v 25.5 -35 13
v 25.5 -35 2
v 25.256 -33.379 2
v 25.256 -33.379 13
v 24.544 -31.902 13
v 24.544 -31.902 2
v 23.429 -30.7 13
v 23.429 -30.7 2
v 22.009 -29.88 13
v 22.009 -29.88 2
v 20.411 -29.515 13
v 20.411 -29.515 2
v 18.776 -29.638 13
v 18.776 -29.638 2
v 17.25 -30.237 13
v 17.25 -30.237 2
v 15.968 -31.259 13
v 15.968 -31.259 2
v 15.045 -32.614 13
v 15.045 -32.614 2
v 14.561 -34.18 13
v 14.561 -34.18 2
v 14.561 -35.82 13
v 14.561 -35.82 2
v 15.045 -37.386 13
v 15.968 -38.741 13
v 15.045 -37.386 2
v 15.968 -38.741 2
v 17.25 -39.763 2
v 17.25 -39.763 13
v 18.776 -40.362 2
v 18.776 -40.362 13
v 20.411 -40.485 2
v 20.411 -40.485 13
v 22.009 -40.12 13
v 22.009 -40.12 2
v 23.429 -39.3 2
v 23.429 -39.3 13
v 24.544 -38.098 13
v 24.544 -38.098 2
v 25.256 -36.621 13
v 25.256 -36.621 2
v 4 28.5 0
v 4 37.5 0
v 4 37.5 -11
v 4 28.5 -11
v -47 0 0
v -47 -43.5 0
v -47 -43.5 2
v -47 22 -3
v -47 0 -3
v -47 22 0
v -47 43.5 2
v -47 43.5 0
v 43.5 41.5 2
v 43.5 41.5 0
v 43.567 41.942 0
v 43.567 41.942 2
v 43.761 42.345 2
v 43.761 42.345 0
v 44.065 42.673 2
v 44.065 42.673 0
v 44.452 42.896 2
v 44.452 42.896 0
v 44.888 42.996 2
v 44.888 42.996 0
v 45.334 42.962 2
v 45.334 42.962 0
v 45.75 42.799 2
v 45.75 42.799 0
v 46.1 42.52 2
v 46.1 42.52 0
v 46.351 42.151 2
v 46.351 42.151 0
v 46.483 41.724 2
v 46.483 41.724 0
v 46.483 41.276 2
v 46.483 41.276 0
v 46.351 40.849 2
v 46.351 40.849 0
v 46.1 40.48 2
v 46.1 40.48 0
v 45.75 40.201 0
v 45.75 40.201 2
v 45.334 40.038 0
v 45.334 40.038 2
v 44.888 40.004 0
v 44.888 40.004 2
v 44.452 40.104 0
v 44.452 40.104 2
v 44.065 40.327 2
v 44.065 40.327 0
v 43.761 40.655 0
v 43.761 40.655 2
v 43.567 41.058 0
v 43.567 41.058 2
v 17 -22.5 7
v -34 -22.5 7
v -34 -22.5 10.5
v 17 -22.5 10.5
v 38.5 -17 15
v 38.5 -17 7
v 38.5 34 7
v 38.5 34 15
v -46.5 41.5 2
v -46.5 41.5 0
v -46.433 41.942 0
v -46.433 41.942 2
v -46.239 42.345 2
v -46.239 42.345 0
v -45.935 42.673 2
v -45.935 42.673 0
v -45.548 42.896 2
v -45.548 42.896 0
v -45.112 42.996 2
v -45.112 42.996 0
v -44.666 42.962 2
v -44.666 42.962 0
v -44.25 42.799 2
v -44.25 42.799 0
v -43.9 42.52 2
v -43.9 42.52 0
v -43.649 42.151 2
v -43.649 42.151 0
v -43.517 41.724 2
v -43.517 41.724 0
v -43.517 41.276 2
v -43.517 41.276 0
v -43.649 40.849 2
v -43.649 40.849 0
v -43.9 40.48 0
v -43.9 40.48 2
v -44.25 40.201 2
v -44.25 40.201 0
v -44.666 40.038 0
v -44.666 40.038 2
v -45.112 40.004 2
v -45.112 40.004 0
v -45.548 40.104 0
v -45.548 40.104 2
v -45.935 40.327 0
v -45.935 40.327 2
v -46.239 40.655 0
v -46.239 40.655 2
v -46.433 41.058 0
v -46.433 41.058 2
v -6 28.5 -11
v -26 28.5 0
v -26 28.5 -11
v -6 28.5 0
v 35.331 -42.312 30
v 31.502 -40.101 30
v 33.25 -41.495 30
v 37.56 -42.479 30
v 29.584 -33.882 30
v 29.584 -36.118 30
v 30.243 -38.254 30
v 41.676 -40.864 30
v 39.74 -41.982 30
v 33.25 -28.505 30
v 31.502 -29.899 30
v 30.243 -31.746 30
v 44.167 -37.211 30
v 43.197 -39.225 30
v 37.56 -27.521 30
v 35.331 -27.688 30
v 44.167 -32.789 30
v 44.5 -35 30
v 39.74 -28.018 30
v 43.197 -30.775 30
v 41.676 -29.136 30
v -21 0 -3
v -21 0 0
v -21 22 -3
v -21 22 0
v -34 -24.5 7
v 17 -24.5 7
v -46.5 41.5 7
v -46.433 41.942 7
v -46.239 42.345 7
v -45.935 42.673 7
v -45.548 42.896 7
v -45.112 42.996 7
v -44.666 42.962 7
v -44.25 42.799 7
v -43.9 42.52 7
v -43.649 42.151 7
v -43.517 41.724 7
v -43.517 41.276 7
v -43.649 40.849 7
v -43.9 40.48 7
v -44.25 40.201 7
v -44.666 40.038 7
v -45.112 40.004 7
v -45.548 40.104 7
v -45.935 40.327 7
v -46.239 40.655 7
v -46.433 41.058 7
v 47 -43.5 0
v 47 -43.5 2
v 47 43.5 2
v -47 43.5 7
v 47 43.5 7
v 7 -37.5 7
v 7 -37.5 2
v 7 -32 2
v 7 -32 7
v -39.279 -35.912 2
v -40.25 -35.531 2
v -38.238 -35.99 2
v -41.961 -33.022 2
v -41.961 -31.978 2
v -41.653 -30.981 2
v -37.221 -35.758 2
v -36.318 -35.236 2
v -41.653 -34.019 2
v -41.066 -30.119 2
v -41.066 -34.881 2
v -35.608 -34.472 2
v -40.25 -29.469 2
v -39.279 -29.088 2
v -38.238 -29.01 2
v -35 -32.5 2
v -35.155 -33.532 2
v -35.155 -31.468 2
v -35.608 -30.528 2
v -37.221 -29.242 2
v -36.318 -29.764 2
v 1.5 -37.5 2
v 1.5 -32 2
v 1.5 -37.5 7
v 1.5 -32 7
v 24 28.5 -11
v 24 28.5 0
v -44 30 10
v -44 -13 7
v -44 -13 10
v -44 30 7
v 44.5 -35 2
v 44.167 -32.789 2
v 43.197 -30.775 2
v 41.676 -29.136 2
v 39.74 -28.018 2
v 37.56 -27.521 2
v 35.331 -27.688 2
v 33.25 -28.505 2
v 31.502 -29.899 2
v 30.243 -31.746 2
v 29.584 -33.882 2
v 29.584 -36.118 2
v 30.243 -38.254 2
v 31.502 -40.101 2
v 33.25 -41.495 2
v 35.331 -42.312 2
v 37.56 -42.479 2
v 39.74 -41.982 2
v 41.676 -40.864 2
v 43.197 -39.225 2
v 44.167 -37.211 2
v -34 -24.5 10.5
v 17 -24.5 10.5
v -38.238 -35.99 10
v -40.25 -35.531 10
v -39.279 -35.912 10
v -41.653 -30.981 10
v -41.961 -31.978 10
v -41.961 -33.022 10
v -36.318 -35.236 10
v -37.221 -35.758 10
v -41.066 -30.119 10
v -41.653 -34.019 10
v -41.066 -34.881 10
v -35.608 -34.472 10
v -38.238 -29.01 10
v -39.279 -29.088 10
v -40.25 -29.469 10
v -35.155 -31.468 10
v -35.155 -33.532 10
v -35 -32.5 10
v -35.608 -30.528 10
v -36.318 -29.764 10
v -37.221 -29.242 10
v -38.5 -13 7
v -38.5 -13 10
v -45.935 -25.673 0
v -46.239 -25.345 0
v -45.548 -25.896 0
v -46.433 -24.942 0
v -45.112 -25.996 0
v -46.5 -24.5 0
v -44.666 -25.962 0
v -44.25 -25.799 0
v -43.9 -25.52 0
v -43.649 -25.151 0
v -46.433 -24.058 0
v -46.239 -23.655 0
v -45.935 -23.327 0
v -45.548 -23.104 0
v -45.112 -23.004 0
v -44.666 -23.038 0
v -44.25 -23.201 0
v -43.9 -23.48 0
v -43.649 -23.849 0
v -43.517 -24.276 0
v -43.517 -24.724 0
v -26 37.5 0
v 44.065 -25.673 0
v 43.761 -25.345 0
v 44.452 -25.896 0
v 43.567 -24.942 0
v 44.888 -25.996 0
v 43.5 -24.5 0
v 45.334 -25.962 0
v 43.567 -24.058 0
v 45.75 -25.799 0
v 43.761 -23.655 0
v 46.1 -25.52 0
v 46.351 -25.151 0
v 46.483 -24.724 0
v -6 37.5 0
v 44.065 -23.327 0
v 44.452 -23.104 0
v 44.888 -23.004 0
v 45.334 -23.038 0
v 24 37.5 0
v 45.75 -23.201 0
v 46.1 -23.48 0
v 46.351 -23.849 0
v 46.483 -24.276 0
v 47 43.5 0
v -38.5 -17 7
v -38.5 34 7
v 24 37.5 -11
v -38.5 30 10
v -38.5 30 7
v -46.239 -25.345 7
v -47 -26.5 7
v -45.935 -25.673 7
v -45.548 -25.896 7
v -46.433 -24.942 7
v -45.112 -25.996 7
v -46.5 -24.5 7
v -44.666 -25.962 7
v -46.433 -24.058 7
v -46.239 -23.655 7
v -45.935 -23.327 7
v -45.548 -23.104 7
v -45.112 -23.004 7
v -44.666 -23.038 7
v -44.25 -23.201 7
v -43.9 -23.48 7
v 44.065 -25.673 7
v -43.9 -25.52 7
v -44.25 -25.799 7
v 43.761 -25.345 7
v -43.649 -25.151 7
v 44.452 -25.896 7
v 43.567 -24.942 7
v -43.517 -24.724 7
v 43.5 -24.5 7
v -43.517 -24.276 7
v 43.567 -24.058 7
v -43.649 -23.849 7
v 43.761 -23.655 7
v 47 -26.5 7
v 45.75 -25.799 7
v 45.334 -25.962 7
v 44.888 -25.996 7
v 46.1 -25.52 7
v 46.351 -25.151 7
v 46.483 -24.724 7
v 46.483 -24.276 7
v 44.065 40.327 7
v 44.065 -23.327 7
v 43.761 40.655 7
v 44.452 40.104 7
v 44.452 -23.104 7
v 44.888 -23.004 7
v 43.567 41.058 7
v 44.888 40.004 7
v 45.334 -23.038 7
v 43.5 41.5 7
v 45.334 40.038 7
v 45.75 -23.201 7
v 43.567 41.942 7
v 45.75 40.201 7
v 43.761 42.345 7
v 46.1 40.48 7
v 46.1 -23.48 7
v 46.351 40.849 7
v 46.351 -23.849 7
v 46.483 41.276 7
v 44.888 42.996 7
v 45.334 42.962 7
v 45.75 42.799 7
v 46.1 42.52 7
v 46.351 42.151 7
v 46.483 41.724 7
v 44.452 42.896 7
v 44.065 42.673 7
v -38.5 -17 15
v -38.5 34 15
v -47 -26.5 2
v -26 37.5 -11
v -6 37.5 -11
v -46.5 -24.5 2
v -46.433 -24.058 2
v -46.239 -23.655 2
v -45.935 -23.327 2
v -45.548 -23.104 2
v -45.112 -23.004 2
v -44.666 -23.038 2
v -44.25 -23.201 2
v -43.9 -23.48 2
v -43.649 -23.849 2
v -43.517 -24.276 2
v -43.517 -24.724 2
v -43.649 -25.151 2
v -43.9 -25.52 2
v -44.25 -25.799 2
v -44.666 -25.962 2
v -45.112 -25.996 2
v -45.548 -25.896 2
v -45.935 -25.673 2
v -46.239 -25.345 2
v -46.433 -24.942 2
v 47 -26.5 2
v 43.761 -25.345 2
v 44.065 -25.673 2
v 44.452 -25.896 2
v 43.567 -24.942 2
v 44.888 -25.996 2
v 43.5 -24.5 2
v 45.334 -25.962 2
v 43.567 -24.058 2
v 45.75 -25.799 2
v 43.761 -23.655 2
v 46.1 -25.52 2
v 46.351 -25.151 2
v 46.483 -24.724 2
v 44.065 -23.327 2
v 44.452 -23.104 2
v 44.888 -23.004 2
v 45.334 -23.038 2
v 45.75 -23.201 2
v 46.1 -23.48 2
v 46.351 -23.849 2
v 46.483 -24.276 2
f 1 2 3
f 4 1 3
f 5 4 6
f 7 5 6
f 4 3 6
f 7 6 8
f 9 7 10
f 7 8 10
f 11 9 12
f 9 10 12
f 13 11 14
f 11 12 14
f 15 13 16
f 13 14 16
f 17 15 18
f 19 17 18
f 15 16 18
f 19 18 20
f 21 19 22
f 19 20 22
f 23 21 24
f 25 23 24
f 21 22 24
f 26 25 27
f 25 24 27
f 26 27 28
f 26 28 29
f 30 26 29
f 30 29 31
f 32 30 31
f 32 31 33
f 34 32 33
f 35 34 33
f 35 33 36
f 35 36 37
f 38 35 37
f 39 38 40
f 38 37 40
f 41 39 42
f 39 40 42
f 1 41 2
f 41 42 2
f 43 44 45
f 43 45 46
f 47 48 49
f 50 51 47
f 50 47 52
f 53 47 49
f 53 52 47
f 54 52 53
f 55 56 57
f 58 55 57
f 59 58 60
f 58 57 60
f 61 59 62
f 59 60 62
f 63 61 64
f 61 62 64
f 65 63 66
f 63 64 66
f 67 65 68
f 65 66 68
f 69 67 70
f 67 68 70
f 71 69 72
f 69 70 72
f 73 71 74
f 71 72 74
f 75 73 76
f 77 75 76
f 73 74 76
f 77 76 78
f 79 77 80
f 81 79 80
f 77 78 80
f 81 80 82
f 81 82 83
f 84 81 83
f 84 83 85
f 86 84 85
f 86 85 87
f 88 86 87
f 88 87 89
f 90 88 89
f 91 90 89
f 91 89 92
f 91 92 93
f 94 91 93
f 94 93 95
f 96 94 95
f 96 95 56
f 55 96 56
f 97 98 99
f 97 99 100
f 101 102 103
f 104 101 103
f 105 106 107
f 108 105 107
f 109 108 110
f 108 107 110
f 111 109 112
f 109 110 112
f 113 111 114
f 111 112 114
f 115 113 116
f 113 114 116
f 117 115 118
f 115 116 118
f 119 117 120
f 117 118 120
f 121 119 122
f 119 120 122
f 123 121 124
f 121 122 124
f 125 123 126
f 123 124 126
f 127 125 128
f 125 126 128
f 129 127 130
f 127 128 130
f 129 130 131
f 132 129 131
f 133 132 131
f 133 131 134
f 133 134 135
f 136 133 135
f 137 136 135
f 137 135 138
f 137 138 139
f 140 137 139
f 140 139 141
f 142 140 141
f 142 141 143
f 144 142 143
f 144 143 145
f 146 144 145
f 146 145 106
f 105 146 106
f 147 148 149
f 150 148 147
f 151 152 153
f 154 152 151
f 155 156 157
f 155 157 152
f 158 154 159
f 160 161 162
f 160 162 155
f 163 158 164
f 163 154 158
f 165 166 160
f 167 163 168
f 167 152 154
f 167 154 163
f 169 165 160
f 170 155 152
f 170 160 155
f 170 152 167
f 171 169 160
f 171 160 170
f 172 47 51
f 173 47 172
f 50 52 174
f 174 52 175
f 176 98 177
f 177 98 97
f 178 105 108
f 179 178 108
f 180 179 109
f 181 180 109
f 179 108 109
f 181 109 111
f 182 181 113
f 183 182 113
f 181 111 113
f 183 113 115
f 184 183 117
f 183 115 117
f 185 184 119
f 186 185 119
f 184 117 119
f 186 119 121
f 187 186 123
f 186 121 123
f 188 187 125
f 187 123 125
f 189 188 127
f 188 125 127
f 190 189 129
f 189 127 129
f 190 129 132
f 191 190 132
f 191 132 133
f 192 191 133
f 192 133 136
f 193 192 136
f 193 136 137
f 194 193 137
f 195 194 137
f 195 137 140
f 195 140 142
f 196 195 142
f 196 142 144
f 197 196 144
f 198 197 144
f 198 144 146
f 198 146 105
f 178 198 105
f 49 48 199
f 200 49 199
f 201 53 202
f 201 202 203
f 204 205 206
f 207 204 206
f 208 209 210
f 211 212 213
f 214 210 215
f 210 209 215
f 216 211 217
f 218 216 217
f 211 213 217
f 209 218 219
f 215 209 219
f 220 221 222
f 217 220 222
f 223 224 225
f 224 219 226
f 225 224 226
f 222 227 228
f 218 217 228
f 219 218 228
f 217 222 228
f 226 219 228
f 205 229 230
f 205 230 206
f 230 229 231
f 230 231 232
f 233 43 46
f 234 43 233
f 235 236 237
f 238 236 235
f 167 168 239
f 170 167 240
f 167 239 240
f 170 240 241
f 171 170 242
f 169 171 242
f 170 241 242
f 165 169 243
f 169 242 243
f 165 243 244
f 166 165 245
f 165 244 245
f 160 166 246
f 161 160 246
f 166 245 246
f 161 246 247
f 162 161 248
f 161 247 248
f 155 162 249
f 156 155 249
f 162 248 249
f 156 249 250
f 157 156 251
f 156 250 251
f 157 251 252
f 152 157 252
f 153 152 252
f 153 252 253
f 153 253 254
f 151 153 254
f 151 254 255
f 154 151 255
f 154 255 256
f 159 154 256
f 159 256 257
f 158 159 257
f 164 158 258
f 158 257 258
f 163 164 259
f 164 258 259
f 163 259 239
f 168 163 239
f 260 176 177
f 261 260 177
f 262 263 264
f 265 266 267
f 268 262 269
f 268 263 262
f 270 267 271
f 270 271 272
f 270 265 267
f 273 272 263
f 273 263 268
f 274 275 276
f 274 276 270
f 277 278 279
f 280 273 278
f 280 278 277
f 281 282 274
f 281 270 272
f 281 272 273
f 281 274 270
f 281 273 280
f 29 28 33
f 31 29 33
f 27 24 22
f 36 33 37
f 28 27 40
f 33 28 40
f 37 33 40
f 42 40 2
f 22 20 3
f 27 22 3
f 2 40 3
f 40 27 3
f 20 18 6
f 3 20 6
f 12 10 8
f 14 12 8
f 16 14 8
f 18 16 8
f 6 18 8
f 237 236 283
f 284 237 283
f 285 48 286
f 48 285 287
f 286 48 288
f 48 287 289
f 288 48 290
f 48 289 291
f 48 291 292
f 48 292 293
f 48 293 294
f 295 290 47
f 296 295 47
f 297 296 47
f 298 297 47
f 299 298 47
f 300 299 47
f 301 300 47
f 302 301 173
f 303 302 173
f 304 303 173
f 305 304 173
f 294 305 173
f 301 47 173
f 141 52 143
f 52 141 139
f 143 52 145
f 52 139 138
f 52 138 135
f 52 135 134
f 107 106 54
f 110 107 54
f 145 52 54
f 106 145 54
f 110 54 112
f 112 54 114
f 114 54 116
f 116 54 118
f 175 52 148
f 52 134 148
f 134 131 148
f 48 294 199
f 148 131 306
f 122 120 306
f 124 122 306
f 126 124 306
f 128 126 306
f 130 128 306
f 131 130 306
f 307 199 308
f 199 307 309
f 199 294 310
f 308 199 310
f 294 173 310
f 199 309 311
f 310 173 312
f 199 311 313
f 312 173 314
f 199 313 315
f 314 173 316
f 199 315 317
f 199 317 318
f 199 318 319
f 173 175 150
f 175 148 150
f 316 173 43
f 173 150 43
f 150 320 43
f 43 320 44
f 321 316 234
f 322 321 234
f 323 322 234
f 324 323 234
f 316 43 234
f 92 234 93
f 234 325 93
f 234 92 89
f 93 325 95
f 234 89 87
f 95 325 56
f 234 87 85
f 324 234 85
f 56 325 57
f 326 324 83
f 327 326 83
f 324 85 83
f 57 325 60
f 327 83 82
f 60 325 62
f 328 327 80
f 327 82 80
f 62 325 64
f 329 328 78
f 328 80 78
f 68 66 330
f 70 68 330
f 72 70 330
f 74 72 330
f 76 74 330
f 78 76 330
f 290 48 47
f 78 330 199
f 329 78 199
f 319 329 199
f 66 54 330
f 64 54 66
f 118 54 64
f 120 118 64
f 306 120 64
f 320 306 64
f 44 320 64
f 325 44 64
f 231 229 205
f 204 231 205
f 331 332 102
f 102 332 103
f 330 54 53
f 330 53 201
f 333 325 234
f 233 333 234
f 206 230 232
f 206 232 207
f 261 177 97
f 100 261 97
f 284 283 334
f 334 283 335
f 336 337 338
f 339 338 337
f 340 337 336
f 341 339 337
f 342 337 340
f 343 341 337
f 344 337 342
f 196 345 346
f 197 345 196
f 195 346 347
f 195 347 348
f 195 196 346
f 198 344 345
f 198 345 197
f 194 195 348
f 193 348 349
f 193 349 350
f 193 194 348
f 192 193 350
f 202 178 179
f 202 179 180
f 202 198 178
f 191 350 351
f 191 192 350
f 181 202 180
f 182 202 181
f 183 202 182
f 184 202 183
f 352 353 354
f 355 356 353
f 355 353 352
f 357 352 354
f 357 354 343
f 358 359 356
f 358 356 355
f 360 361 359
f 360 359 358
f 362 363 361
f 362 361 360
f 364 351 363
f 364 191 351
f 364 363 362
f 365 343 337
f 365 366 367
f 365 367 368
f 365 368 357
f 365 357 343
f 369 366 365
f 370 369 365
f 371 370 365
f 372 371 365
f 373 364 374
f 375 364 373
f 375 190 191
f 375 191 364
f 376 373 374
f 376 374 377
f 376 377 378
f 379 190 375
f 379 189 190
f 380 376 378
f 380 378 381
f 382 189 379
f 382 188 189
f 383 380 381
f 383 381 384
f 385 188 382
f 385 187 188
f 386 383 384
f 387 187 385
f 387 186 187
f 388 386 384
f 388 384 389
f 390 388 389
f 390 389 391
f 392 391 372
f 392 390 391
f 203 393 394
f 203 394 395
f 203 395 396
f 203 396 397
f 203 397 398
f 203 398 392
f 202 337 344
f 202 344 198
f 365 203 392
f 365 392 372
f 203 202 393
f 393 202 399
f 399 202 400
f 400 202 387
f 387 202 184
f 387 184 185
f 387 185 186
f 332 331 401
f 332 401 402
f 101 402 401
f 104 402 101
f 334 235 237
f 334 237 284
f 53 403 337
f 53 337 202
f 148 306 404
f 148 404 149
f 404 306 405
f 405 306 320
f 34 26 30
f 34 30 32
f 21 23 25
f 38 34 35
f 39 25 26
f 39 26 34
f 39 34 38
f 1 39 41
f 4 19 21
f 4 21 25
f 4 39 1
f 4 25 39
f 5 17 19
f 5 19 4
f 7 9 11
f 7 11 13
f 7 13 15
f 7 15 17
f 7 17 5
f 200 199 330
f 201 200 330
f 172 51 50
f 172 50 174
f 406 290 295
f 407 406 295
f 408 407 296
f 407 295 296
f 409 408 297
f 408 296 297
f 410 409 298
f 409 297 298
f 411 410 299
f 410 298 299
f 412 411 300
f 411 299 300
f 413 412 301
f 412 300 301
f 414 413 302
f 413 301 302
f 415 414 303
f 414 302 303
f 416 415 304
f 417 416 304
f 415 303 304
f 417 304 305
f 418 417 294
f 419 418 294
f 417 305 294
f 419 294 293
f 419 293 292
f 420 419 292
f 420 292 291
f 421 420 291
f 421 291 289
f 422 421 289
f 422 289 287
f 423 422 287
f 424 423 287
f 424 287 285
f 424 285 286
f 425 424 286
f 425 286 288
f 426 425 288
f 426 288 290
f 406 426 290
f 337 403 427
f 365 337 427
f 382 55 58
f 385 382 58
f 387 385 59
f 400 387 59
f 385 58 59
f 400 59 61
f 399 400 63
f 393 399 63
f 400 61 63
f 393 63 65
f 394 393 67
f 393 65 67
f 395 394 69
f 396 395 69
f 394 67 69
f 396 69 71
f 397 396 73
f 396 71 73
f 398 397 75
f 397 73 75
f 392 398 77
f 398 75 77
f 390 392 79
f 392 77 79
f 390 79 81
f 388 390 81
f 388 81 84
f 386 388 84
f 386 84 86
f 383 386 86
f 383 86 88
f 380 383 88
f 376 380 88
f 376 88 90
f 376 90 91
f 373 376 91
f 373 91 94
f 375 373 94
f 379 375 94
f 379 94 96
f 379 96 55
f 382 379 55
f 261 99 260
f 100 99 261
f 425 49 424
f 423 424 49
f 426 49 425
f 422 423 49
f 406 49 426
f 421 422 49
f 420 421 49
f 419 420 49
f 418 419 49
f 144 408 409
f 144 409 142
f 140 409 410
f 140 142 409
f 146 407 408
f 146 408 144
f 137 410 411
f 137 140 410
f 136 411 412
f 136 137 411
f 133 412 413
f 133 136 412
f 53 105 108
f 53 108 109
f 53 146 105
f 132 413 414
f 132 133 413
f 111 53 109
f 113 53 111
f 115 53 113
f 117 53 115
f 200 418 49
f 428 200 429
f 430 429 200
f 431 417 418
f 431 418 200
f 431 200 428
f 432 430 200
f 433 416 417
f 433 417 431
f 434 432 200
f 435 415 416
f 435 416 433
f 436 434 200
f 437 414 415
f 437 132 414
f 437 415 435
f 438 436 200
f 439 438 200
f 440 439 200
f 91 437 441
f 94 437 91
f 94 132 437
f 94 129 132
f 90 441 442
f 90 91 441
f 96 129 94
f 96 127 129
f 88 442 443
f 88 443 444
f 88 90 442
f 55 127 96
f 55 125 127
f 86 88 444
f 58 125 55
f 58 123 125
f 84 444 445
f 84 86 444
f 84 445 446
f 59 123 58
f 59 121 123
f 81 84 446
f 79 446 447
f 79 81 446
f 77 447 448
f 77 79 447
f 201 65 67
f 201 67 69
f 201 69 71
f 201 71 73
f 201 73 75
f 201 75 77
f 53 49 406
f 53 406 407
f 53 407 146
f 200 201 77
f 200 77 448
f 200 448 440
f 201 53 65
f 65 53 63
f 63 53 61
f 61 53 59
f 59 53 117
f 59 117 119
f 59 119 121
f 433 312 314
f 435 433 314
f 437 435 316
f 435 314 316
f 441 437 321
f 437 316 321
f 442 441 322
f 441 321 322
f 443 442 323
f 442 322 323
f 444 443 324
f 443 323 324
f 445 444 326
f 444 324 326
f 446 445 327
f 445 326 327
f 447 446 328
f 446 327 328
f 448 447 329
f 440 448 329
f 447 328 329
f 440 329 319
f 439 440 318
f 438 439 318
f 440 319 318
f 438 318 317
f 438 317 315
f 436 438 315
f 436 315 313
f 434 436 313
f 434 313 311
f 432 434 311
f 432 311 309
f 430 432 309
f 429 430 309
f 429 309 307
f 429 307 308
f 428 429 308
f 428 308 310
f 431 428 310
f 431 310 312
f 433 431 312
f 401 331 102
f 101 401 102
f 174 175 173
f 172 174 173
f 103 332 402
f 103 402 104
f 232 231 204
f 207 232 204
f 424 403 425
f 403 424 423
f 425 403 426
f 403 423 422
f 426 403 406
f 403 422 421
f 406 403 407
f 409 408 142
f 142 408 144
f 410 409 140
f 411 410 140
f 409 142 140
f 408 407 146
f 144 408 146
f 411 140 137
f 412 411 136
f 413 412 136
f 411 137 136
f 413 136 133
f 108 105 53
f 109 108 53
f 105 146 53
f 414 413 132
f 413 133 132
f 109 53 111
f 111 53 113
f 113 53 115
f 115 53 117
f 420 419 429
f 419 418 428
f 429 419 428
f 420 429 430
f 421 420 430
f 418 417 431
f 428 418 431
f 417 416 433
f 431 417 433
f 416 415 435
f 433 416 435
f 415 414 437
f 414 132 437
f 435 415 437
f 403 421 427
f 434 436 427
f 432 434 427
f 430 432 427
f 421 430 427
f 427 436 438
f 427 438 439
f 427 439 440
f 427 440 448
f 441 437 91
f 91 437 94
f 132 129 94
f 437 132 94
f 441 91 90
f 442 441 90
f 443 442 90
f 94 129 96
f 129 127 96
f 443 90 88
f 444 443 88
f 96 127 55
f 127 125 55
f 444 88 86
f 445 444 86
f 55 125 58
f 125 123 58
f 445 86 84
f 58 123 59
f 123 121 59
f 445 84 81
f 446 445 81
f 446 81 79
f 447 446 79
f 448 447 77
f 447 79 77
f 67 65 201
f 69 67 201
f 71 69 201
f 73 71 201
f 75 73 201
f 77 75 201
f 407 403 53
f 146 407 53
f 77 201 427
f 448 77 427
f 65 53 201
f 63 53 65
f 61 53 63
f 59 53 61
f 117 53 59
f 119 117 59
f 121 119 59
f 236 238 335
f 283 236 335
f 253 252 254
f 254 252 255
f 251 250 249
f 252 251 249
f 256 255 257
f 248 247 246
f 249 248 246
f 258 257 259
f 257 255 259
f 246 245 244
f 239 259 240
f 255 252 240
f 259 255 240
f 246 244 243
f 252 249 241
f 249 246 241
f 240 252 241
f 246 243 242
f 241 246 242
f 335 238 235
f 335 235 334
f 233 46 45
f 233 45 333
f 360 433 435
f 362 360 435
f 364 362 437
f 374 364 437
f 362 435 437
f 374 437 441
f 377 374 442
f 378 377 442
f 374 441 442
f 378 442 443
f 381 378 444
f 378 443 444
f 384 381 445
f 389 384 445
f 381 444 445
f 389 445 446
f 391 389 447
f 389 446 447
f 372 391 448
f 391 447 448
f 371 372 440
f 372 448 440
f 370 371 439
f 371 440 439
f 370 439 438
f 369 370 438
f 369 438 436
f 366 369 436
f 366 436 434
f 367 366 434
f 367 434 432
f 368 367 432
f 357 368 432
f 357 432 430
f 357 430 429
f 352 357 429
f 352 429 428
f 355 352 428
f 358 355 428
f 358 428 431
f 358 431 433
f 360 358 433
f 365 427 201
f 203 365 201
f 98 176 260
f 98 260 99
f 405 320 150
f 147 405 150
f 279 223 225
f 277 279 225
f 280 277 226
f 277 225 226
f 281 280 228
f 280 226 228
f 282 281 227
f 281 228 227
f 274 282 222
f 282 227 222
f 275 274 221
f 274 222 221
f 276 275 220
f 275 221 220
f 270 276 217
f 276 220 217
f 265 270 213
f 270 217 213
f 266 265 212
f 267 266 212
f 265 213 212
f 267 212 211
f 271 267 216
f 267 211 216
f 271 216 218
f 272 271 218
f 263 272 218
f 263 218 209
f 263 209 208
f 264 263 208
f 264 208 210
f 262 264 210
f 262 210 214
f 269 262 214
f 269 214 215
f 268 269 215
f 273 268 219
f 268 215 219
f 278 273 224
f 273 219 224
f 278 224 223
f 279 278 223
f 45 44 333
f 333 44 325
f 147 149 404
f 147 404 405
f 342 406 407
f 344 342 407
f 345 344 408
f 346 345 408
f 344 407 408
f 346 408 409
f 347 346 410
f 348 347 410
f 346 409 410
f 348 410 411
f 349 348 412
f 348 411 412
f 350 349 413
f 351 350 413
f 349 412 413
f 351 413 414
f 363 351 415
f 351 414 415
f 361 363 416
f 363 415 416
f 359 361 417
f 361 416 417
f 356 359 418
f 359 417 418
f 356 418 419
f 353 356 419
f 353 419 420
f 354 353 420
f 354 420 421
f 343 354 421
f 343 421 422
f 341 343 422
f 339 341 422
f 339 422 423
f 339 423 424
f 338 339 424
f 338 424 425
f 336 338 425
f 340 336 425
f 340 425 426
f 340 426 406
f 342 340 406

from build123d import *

# Parameters (mm, degrees)
F0_W        = 94
F0_H        = 87
F1_DEPTH    = 2
F2_W        = 94
F2_H        = 70
F3_DEPTH    = 5
F4_W        = 77
F4_H        = 51
F5_DEPTH    = 8
F6_W        = 5.5
F6_H        = 43
F7_DEPTH    = 3
F8_R        = 7.5
F9_DEPTH    = 28
F10_R       = 5.5
F11_DEPTH   = 11
F12_W       = 5.5
F12_H       = 5.5
F13_DEPTH   = 5
F14_R       = 3.5
F15_DEPTH   = 8
F17_D       = 3
F17_DEPTH   = 20
F17_2_D     = 3
F17_2_DEPTH = 20
F18_D       = 3
F18_2_D     = 3
F19_W       = 51
F19_H       = 2
F20_DEPTH   = 3.5
F21_W       = 26
F21_H       = 22
F22_DEPTH   = 3
F23_W       = 20
F23_H       = 9
F24_DEPTH   = 11


with BuildPart() as f1:
    # F0 (on Top) → F1 (new body)
    with BuildSketch(Plane.XY):
        Rectangle(F0_W, F0_H)
    extrude(amount=F1_DEPTH)

    # F17
    with Locations(Plane.XY.offset(7)):
        with Locations((-45, 41.5)):
            Hole(F17_D / 2, depth=F17_DEPTH)

    # F18 (through all)
    with Locations(Plane.XY.offset(7)):
        with Locations((45, 41.5), (45, -24.5), (-45, -24.5)):
            Hole(F18_D / 2)

    # F21 (on face) → F22 (join)
    with BuildSketch(Plane(origin=(0, 0, 0), x_dir=(1, 0, 0), z_dir=(0, 0, -1))):
        with Locations((-34, -11)):
            Rectangle(F21_W, F21_H)
    extrude(amount=F22_DEPTH)

    # F23 (on face) → F24 (join)
    with BuildSketch(Plane(origin=(0, 0, 0), x_dir=(1, 0, 0), z_dir=(0, 0, -1))):
        with Locations((14, -33)):
            Rectangle(F23_W, F23_H)
        with Locations((-16, -33)):
            Rectangle(F23_W, F23_H)
    extrude(amount=F24_DEPTH)


with BuildPart() as f3:
    # F2 (on face) → F3 (new body)
    with BuildSketch(Plane.XY.offset(2)):
        with Locations((0, 8.5)):
            Rectangle(F2_W, F2_H)
    extrude(amount=F3_DEPTH)

    # F17#2
    with Locations(Plane.XY.offset(7)):
        with Locations((-45, 41.5)):
            Hole(F17_2_D / 2, depth=F17_2_DEPTH)

    # F18#2 (through all)
    with Locations(Plane.XY.offset(7)):
        with Locations((45, 41.5), (45, -24.5), (-45, -24.5)):
            Hole(F18_2_D / 2)


with BuildPart() as f5:
    # F4 (on face) → F5 (new body)
    with BuildSketch(Plane.XY.offset(7)):
        with Locations((0, 8.5)):
            Rectangle(F4_W, F4_H)
    extrude(amount=F5_DEPTH)


with BuildPart() as f7:
    # F6 (on face) → F7 (new body)
    with BuildSketch(Plane.XY.offset(7)):
        with Locations((-41.25, 8.5)):
            Rectangle(F6_W, F6_H)
    extrude(amount=F7_DEPTH)


with BuildPart() as f9:
    # F8 (on face) → F9 (new body)
    with BuildSketch(Plane.XY.offset(2)):
        with Locations((37, -35)):
            Circle(F8_R)
    extrude(amount=F9_DEPTH)


with BuildPart() as f11:
    # F10 (on face) → F11 (new body)
    with BuildSketch(Plane.XY.offset(2)):
        with Locations((20, -35)):
            Circle(F10_R)
    extrude(amount=F11_DEPTH)


with BuildPart() as f13:
    # F12 (on face) → F13 (new body)
    with BuildSketch(Plane.XY.offset(2)):
        with Locations((4.25, -34.75)):
            Rectangle(F12_W, F12_H)
    extrude(amount=F13_DEPTH)


with BuildPart() as f15:
    # F14 (on face) → F15 (new body)
    with BuildSketch(Plane.XY.offset(2)):
        with Locations((-38.5, -32.5)):
            Circle(F14_R)
    extrude(amount=F15_DEPTH)


with BuildPart() as f20:
    # F19 (on face) → F20 (new body)
    with BuildSketch(Plane.XY.offset(7)):
        with Locations((-8.5, -23.5)):
            Rectangle(F19_W, F19_H)
    extrude(amount=F20_DEPTH)


solid = Compound([f1.part, f3.part, f5.part, f7.part, f9.part, f11.part, f13.part, f15.part, f20.part])
